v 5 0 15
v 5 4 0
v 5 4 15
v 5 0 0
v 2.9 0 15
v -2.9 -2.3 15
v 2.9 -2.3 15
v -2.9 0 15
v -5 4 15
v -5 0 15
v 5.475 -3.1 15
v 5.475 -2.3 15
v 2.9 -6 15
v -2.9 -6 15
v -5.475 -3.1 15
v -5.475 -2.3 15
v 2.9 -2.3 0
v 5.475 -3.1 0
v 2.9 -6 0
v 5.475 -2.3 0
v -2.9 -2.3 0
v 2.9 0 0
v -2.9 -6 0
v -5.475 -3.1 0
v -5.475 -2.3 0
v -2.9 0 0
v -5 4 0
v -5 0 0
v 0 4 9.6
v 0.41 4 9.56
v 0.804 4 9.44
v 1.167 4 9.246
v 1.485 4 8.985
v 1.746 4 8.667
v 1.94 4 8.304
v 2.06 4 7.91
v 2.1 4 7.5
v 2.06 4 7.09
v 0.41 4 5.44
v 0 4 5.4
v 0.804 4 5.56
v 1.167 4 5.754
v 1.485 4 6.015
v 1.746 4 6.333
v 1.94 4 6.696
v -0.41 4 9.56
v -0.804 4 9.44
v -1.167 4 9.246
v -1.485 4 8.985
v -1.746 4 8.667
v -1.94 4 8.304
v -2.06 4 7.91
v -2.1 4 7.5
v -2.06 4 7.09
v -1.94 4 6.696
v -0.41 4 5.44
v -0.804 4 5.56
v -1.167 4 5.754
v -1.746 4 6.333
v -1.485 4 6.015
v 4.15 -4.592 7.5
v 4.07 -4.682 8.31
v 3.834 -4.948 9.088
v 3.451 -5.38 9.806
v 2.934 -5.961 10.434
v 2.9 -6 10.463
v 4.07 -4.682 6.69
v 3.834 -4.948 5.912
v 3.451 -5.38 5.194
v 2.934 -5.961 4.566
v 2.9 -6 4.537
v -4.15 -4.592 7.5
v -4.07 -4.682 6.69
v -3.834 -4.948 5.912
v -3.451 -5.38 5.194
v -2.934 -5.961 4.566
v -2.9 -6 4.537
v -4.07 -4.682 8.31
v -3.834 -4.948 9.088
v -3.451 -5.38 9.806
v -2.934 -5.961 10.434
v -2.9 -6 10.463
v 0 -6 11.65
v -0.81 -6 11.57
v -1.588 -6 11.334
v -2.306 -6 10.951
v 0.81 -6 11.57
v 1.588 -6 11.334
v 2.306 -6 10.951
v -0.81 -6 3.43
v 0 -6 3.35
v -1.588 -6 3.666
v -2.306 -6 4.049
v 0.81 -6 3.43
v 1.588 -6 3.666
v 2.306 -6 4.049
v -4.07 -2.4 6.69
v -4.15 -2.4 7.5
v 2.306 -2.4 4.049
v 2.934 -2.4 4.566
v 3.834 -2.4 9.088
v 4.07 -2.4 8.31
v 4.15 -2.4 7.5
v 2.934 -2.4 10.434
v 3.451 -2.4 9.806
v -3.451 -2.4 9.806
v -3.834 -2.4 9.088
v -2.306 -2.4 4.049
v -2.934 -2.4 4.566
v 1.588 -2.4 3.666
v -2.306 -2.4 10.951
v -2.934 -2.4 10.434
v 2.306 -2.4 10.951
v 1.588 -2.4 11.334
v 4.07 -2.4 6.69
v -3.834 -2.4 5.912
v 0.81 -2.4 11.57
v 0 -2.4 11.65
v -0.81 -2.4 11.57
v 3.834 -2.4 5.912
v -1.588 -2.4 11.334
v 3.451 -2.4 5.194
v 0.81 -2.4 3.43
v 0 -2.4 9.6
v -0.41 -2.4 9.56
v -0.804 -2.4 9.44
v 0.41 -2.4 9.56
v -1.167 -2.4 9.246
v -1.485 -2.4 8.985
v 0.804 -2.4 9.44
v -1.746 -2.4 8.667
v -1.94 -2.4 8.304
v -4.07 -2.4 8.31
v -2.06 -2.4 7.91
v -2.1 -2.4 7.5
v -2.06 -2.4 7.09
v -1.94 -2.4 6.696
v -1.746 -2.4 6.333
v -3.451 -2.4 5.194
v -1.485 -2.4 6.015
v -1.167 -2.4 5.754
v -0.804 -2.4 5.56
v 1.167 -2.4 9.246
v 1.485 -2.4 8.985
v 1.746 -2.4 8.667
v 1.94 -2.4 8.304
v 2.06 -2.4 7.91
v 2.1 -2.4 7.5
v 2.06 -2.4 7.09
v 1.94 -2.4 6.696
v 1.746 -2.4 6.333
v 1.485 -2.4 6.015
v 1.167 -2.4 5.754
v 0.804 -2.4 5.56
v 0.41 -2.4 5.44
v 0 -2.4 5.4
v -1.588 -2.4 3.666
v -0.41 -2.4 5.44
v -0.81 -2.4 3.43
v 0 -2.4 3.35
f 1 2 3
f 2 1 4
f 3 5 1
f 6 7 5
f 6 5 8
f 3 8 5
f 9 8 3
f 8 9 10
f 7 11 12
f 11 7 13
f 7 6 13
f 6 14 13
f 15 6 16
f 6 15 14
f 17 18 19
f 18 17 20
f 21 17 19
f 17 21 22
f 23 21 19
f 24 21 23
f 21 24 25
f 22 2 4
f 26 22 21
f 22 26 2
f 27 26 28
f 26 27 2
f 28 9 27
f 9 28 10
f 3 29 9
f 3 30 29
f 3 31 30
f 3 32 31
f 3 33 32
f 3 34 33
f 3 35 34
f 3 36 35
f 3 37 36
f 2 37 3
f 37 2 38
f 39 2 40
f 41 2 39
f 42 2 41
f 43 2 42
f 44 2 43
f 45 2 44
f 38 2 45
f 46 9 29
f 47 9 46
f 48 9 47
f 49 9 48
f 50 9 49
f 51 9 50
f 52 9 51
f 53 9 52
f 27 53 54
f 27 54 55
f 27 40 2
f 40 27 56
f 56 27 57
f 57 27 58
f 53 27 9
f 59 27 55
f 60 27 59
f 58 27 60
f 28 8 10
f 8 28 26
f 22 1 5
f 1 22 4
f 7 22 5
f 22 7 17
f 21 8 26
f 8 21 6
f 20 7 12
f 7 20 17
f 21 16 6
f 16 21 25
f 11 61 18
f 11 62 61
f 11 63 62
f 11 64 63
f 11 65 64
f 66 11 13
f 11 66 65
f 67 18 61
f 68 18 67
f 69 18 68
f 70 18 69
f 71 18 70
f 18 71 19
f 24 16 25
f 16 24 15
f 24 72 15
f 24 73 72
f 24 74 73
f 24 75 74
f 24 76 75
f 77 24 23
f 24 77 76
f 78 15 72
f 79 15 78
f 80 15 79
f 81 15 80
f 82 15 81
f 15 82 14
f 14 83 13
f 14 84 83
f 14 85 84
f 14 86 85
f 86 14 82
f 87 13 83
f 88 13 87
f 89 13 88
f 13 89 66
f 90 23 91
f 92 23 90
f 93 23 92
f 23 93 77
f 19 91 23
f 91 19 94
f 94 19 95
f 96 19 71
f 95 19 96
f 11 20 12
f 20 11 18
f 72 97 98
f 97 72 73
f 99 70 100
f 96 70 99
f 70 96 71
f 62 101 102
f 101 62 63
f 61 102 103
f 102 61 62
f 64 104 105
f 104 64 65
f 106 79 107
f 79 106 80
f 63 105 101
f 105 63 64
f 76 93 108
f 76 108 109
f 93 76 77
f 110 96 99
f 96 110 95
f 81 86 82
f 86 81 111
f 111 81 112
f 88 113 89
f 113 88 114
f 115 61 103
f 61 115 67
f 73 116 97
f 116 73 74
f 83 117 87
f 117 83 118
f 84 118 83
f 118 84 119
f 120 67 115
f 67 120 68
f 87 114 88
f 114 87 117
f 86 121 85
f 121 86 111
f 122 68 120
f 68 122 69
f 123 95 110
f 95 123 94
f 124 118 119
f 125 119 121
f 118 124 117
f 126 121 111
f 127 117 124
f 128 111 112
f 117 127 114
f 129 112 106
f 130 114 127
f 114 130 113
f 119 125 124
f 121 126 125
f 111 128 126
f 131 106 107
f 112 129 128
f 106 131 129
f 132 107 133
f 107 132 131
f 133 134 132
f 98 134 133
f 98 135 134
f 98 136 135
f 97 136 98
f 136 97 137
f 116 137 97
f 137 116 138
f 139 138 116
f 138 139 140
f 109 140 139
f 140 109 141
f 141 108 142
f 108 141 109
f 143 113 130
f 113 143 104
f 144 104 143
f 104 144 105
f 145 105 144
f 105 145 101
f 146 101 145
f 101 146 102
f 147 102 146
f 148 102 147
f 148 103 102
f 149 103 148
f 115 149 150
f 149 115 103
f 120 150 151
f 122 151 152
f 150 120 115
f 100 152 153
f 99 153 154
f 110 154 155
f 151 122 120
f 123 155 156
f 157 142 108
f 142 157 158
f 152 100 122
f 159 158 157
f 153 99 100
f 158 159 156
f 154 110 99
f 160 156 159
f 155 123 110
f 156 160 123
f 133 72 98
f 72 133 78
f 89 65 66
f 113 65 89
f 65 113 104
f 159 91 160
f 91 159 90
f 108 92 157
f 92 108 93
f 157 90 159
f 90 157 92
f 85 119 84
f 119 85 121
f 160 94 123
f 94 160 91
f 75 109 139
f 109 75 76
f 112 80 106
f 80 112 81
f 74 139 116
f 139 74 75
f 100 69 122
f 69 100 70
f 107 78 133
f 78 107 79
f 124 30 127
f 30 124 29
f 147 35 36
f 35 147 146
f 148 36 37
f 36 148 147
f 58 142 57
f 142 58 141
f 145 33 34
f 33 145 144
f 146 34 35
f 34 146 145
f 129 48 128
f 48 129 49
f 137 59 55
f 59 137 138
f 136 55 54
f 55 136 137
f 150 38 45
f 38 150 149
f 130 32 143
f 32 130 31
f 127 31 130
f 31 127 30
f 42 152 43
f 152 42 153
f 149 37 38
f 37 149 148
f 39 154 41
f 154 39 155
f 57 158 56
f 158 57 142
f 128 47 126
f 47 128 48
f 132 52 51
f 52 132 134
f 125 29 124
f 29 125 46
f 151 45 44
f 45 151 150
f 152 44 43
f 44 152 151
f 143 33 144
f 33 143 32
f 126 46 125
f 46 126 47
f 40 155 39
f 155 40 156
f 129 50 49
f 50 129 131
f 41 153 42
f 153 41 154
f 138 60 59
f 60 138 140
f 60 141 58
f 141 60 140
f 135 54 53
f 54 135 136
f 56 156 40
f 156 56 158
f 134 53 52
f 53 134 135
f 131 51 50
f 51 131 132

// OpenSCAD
// file: 2020-insert.scad
slotneckw= 6-0.2;
slotthick= 2+0.3;
slotdepth= 3.2+0.6-0.1;
slotwidth= 9.95+1.0;
shoulder=0.8;
edge= (slotwidth-slotneckw)/2;
diagl=3.6;

p1= [0,0];
p2= [slotwidth,0];
p3= [slotwidth,-shoulder];
p4= [slotwidth-edge,-slotdepth];
p5= [edge,-slotdepth];
p6= [0,-shoulder];
p7= [0,0];

module slider_body(width, height, thick) {
	union() {
		translate([-width/2,slotthick,0]) cube([width,thick,height]);
		translate([-slotneckw/2,0,0]) cube([slotneckw, slotthick, height]);
		translate([-slotwidth/2,0,0]) linear_extrude(height=height)
			polygon(points=[ p1,p2,p3,p4,p5,p6,p7 ]);
	}
}

module slider2020(w= 20, h= 20, t=2) {
	translate([0,-slotthick,0]) slider_body(w, h, t);
}

slider2020(w=10, h=10, t=2);
// main file
use <2020-insert.scad>

difference() {
	slider2020(h=15, w=10, t=4);
	#translate([0,-6+3.6,15/2]) rotate([90,0,0]) cylinder(r=7.9/2+0.2, h=5, $fn=32);
	#translate([0,6,15/2]) rotate([90,0,0]) cylinder(r=(4+0.2)/2, h=10, $fn=32);
}
